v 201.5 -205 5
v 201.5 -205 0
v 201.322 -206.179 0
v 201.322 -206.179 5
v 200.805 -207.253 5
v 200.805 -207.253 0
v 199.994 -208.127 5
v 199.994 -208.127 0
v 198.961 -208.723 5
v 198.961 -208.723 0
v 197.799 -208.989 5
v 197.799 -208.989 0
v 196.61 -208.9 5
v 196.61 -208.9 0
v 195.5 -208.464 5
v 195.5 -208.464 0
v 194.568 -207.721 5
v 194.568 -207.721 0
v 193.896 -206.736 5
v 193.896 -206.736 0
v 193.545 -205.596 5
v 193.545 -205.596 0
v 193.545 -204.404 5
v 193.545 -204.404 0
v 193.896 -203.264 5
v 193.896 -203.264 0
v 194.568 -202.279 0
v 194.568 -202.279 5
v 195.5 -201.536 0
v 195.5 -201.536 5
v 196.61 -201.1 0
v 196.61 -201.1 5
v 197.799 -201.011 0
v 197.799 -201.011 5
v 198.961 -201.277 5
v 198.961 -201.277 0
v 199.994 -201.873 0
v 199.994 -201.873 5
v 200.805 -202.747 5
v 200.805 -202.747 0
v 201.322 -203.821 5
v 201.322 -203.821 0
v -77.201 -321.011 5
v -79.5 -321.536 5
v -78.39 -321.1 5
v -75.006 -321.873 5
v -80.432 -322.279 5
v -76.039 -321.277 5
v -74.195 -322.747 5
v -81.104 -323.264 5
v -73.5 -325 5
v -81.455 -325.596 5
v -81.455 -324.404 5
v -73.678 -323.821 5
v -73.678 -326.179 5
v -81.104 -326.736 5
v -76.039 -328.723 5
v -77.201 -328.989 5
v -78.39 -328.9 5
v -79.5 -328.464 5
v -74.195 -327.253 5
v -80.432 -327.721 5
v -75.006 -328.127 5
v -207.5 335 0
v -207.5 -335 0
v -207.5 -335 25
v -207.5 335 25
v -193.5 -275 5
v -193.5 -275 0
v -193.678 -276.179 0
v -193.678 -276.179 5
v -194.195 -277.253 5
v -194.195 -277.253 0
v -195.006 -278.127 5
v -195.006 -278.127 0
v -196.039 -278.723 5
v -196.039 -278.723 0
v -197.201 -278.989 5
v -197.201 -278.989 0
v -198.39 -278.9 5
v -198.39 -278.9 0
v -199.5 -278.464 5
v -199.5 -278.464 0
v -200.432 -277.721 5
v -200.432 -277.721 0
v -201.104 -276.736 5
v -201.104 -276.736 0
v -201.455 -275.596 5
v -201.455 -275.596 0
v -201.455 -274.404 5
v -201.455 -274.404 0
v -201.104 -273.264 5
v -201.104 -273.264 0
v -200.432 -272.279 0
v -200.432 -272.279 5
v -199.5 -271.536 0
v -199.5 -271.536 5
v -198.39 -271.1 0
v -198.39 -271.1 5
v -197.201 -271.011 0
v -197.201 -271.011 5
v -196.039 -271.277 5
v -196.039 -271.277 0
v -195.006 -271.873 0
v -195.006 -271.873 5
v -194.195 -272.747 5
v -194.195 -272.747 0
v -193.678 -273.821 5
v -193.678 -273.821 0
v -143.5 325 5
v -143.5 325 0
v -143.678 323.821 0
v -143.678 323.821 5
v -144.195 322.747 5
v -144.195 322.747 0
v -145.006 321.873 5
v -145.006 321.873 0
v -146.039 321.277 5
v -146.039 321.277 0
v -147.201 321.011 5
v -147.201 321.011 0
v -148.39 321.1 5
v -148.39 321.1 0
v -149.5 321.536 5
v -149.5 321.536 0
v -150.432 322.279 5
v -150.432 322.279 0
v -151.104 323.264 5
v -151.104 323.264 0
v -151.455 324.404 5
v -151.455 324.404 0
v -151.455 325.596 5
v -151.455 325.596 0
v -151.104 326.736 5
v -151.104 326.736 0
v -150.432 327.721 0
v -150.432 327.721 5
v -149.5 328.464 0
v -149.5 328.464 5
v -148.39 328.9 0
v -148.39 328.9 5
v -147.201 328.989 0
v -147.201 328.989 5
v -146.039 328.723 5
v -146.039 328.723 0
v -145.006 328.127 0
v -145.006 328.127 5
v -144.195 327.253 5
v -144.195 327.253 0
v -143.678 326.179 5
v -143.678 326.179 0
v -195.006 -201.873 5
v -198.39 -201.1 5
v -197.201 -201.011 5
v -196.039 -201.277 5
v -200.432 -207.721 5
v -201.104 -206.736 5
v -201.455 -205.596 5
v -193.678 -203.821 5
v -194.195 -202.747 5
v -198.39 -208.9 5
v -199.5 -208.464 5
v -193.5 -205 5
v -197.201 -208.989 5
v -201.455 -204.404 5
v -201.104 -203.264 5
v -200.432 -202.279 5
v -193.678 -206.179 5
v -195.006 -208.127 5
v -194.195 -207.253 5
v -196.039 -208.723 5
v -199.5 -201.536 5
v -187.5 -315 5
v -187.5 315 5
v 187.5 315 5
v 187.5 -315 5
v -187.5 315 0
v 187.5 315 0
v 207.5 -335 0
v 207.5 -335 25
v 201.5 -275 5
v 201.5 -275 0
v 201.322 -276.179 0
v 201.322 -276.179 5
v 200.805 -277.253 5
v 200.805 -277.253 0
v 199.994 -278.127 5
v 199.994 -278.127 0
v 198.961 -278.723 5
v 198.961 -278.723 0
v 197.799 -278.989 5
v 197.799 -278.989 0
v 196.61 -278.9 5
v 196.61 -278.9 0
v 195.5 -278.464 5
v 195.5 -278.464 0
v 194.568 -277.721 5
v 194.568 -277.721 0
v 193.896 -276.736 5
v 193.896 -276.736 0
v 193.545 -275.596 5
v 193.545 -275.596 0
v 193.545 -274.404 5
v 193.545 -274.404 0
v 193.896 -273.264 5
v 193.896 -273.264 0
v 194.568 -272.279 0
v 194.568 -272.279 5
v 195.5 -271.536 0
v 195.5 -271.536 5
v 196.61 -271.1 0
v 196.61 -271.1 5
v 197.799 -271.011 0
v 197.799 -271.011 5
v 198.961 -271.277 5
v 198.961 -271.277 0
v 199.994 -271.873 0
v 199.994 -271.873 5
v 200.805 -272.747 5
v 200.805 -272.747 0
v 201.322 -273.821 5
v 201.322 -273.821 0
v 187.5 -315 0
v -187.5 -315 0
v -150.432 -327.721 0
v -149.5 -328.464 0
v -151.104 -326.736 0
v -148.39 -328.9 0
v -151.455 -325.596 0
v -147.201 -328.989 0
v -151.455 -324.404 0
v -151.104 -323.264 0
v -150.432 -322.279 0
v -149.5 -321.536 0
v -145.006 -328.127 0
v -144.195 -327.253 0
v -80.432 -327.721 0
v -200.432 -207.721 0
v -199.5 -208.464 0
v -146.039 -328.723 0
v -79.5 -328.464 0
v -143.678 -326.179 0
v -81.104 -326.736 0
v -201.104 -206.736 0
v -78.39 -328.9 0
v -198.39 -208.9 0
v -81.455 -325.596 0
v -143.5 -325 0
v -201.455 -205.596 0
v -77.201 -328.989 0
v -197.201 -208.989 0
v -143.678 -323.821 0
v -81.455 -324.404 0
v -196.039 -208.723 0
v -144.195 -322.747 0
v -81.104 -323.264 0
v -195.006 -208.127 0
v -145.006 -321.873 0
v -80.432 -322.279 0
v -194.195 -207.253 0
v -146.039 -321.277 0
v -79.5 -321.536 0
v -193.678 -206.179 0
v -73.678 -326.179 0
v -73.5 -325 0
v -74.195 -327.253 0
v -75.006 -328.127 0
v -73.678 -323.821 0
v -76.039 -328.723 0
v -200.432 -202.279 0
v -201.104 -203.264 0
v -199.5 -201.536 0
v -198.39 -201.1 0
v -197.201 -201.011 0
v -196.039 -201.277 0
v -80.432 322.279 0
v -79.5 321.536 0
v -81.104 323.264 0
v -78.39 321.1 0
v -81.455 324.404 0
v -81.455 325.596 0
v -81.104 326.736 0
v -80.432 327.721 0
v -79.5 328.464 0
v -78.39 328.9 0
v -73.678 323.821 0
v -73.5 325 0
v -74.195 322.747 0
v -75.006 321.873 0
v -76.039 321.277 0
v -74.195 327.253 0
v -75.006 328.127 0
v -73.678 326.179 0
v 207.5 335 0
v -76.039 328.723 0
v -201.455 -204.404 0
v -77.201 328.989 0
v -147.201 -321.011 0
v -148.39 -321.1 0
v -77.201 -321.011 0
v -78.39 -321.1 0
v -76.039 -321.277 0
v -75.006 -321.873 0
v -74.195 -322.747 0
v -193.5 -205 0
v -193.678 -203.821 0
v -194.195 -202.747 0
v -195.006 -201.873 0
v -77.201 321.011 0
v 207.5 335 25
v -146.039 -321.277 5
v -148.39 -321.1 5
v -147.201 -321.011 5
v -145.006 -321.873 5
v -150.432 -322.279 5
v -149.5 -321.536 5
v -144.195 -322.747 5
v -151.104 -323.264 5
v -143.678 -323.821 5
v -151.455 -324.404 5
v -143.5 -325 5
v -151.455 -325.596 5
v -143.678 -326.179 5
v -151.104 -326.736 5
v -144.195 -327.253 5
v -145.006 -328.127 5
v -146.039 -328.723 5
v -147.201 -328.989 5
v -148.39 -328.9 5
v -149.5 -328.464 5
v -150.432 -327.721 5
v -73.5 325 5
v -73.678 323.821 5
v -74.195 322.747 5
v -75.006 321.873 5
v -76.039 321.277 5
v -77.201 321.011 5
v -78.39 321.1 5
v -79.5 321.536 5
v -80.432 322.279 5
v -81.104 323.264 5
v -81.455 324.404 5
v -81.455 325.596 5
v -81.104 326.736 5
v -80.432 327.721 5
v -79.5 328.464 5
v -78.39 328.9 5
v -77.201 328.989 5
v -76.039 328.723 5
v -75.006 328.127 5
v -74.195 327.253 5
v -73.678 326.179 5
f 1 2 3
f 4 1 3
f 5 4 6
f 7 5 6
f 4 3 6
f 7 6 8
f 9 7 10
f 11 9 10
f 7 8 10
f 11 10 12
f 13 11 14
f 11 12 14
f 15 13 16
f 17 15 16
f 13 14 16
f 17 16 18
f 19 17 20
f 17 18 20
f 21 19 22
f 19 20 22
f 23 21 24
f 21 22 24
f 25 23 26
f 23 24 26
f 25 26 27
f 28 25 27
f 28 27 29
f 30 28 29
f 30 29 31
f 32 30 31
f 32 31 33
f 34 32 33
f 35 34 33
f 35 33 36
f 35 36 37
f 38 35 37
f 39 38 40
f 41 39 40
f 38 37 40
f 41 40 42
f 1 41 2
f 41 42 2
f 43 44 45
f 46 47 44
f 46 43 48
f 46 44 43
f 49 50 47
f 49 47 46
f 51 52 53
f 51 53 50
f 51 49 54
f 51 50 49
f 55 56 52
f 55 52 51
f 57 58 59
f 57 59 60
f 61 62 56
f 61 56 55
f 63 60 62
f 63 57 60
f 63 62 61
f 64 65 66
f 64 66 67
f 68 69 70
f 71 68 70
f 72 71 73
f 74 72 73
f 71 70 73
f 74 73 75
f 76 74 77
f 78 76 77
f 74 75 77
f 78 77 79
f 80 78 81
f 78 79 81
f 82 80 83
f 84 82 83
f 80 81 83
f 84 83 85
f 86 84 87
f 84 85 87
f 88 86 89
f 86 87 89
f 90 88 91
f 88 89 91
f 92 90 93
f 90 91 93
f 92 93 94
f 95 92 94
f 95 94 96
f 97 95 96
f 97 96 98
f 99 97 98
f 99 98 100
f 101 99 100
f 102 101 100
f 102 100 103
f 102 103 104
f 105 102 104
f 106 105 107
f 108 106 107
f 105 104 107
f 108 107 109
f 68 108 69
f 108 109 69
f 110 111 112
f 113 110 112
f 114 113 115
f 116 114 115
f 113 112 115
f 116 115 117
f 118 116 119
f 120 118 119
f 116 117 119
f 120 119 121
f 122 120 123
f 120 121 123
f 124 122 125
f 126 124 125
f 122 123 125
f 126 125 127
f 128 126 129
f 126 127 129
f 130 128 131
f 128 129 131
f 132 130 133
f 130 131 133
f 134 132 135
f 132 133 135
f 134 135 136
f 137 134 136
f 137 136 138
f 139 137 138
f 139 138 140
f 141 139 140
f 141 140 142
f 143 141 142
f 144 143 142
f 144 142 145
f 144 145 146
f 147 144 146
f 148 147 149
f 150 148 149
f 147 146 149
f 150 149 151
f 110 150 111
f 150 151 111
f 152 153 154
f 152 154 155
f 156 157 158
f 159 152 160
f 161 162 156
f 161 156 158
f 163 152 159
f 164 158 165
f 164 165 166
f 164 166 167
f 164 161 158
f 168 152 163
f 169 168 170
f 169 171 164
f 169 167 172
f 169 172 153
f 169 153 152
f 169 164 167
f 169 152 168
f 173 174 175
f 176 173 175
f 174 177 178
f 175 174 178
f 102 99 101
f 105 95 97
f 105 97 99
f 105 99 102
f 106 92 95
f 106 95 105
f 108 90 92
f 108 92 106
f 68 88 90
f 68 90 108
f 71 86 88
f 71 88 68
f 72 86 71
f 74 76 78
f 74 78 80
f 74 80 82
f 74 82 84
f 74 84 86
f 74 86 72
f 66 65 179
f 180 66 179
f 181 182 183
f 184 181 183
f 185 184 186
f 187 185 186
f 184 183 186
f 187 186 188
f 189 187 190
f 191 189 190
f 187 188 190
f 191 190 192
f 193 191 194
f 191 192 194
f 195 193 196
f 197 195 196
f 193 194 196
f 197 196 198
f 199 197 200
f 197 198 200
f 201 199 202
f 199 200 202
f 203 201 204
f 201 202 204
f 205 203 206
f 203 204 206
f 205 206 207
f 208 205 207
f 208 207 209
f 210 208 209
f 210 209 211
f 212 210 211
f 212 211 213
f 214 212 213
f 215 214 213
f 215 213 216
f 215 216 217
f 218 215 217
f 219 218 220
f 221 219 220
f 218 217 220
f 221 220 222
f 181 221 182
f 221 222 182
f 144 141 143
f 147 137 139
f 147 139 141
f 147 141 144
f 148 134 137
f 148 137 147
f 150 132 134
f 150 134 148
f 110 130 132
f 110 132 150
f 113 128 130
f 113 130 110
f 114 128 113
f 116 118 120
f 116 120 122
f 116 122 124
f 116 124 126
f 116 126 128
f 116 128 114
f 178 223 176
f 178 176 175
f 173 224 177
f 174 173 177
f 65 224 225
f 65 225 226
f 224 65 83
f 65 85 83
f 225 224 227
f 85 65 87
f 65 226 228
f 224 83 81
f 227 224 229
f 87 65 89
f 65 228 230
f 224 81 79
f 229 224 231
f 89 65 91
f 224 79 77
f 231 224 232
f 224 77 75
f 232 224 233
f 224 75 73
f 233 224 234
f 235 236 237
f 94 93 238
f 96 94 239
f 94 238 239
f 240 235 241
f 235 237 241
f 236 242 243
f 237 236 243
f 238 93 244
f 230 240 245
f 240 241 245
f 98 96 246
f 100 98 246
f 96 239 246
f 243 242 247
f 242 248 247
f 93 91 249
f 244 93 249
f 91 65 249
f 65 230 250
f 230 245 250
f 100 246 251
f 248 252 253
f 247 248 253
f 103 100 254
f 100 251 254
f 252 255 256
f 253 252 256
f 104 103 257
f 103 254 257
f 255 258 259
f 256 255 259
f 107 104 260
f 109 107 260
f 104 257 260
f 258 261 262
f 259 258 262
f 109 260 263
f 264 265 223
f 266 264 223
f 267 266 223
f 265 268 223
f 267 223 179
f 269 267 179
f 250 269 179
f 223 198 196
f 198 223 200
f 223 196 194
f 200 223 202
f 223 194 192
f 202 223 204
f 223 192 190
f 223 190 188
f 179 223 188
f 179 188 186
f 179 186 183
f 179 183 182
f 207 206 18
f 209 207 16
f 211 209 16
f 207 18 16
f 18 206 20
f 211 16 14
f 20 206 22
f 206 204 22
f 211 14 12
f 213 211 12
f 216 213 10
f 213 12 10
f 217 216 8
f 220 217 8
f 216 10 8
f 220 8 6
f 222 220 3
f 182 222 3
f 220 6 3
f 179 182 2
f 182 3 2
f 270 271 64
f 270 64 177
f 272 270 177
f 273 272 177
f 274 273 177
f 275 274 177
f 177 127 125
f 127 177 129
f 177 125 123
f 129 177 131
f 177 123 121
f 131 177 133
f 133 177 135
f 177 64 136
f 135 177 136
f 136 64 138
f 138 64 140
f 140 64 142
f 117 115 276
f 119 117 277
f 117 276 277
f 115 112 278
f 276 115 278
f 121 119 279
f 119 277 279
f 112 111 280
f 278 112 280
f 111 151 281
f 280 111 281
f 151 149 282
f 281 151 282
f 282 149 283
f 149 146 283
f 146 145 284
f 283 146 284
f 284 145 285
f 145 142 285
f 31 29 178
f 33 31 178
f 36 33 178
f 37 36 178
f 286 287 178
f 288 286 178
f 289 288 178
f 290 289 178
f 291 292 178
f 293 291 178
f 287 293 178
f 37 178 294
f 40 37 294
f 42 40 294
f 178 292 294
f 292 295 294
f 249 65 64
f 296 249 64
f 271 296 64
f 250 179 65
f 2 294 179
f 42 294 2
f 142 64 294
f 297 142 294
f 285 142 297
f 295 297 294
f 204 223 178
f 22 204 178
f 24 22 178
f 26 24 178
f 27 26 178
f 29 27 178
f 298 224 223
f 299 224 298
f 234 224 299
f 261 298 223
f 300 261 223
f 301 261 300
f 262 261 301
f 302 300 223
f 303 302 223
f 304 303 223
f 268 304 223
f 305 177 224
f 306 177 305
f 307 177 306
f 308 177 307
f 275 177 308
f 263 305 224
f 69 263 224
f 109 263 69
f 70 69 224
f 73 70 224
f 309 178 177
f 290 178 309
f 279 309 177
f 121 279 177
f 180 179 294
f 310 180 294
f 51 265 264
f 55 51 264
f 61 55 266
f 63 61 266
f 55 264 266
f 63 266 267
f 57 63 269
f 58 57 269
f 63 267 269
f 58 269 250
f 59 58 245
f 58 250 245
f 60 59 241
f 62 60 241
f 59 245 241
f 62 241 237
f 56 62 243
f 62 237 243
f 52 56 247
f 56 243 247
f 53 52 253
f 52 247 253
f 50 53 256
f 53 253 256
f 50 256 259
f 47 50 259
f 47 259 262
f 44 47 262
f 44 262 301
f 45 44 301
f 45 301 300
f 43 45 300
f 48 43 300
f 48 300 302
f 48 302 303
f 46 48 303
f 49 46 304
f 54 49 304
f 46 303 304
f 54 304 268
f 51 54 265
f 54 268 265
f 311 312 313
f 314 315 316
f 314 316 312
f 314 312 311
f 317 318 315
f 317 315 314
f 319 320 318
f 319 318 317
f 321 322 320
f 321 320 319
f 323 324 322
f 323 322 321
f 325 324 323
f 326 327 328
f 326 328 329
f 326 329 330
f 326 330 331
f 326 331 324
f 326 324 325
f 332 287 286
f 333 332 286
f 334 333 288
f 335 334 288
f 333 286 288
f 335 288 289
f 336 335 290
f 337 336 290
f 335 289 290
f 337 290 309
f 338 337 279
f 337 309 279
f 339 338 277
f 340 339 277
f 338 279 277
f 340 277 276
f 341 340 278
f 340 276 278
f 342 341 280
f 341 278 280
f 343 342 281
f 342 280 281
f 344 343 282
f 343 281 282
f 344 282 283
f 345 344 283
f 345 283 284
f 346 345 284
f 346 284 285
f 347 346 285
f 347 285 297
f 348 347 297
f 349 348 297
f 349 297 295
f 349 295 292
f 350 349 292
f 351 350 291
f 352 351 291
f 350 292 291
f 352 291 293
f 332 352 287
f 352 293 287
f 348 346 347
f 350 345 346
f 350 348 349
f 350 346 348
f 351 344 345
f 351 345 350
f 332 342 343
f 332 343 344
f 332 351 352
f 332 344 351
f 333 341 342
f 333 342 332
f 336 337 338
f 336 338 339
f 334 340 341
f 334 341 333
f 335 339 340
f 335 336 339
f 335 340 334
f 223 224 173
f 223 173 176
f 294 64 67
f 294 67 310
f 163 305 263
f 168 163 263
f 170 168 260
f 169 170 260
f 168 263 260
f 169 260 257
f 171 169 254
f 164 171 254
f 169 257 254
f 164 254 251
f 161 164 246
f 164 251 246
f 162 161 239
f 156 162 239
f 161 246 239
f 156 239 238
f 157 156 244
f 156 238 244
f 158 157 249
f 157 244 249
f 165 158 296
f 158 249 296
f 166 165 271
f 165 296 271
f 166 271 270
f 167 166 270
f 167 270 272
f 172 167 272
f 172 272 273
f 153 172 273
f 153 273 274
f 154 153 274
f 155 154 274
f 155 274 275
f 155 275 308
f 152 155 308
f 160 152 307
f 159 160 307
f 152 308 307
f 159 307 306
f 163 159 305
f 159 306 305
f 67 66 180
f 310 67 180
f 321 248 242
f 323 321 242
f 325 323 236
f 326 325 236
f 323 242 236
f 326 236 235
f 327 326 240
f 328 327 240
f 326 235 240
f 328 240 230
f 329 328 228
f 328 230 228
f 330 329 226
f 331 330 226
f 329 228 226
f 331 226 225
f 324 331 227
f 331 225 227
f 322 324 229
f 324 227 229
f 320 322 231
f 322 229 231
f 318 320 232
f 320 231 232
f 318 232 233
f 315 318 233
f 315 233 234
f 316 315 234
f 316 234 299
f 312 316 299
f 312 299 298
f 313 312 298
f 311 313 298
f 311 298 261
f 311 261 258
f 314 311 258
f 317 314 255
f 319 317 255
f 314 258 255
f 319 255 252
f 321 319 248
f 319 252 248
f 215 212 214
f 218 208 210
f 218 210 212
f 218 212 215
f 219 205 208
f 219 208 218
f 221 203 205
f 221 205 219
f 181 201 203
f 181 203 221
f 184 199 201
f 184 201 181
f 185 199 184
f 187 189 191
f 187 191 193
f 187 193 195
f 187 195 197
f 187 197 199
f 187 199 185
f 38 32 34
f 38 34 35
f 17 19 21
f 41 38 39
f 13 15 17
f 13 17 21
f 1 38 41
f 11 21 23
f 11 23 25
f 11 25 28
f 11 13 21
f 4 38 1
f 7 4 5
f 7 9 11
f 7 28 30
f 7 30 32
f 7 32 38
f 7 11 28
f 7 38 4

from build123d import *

# Parameters (mm, degrees)
F0_W     = 415
F0_H     = 670
F1_DEPTH = 25
F2_T     = -20
F3_R     = 4
F4_DEPTH = 5


with BuildPart() as f1:
    # F0 (on Top) → F1 (new body)
    with BuildSketch(Plane.XY):
        Rectangle(F0_W, F0_H)
    extrude(amount=F1_DEPTH)

    # F2
    f2_openings = [f1.faces().sort_by_distance(p)[0] for p in [
        (0, 0, 0),
    ]]
    offset(amount=F2_T, openings=f2_openings)

    # F3 (on face) → F4 (cut)
    with BuildSketch(Plane(origin=(0, 0, 0), x_dir=(1, 0, 0), z_dir=(0, 0, -1))):
        with Locations((-197.5, 275)):
            Circle(F3_R)
        with Locations((-197.5, 205)):
            Circle(F3_R)
        with Locations((197.5, 275)):
            Circle(F3_R)
        with Locations((197.5, 205)):
            Circle(F3_R)
        with Locations((-147.5, 325)):
            Circle(F3_R)
        with Locations((-77.5, 325)):
            Circle(F3_R)
        with Locations((-77.5, -325)):
            Circle(F3_R)
        with Locations((-147.5, -325)):
            Circle(F3_R)
    extrude(amount=-F4_DEPTH, mode=Mode.SUBTRACT)


solid = f1.part
